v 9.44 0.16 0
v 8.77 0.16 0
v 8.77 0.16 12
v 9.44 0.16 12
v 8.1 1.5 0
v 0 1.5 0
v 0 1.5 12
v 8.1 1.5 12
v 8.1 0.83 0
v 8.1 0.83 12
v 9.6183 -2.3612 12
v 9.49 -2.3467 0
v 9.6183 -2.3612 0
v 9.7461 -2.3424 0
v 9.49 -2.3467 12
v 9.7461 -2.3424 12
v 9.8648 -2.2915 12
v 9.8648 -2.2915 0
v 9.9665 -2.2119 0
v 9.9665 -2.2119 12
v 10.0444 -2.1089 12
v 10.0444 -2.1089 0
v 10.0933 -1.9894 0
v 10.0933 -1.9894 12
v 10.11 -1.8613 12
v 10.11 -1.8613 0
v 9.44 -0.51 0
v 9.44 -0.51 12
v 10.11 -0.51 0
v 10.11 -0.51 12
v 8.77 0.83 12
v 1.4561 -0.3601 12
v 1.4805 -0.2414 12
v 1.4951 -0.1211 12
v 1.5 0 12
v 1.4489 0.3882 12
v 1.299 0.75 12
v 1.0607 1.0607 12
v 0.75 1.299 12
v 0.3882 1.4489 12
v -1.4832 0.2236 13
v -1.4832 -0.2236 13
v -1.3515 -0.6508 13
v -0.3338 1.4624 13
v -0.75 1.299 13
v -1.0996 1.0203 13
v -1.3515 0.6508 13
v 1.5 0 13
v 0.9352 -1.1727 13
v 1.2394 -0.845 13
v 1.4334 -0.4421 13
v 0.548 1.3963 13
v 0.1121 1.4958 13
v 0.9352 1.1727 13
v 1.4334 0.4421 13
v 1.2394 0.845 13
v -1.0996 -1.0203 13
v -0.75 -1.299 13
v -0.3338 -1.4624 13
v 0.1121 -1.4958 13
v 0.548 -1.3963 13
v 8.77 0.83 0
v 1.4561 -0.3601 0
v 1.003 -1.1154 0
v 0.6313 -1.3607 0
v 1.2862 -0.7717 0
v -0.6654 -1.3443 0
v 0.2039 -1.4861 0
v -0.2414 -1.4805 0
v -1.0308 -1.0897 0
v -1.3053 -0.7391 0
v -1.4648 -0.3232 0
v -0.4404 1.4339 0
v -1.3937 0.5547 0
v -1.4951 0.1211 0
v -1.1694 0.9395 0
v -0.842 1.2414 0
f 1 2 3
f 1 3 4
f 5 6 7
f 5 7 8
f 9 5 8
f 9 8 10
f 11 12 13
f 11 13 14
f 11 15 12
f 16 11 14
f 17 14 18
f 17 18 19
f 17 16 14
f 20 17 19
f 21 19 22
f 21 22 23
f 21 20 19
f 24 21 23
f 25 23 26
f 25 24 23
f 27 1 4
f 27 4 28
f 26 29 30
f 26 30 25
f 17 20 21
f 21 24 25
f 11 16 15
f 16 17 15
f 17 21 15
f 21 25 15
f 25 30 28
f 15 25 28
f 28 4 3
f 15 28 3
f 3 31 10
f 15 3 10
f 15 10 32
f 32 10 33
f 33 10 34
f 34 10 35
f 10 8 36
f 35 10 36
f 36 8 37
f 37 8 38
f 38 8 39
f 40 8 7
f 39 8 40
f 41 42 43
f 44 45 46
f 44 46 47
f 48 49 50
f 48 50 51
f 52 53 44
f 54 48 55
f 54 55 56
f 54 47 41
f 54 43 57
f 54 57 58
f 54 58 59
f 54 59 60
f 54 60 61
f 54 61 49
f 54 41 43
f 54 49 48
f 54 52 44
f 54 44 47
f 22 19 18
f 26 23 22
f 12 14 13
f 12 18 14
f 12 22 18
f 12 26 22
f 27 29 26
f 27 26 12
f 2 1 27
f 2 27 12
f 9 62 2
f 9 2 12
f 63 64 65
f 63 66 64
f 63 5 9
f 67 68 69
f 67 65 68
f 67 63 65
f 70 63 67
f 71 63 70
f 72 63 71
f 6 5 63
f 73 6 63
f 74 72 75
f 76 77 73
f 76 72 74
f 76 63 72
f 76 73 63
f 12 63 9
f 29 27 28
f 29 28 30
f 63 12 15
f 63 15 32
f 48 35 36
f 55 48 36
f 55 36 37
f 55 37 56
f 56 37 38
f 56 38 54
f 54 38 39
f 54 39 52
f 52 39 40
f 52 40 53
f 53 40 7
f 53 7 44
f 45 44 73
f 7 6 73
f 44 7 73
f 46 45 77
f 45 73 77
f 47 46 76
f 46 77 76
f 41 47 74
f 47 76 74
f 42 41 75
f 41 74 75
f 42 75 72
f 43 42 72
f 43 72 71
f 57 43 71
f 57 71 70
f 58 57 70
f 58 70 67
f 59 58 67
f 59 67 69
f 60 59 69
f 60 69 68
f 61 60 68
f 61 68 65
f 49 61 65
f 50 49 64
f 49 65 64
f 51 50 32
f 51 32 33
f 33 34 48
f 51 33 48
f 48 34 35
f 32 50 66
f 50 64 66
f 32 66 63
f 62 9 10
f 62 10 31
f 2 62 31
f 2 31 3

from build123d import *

# Parameters (mm, degrees)
SKETCH_1_R      = 1.5
EXTRUDE_1_DEPTH = 13
EXTRUDE_2_DEPTH = 12
FILLET_1_R      = 0.5


with BuildPart() as part:
    # 草图1 → 凸台-拉伸1 (new body)
    with BuildSketch(Plane.XY):
        Circle(SKETCH_1_R)
    extrude(amount=EXTRUDE_1_DEPTH)

    # 草图2 → 凸台-拉伸2 (add)
    with BuildSketch(Plane.XY):
        Polygon((0, 1.5), (8.1, 1.5), (8.1, 0.83), (8.77, 0.83), (8.77, 0.16), (9.44, 0.16), (9.44, -0.51), (10.11, -0.51), (10.11, -2.5), (0, 0), align=None)
    extrude(amount=EXTRUDE_2_DEPTH)

    # 圆角1
    fillet_1_edges = [part.edges().sort_by_distance(p)[0] for p in [
        (10.11, -2.5, 6),
    ]]
    fillet(fillet_1_edges, radius=FILLET_1_R)


solid = part.part
